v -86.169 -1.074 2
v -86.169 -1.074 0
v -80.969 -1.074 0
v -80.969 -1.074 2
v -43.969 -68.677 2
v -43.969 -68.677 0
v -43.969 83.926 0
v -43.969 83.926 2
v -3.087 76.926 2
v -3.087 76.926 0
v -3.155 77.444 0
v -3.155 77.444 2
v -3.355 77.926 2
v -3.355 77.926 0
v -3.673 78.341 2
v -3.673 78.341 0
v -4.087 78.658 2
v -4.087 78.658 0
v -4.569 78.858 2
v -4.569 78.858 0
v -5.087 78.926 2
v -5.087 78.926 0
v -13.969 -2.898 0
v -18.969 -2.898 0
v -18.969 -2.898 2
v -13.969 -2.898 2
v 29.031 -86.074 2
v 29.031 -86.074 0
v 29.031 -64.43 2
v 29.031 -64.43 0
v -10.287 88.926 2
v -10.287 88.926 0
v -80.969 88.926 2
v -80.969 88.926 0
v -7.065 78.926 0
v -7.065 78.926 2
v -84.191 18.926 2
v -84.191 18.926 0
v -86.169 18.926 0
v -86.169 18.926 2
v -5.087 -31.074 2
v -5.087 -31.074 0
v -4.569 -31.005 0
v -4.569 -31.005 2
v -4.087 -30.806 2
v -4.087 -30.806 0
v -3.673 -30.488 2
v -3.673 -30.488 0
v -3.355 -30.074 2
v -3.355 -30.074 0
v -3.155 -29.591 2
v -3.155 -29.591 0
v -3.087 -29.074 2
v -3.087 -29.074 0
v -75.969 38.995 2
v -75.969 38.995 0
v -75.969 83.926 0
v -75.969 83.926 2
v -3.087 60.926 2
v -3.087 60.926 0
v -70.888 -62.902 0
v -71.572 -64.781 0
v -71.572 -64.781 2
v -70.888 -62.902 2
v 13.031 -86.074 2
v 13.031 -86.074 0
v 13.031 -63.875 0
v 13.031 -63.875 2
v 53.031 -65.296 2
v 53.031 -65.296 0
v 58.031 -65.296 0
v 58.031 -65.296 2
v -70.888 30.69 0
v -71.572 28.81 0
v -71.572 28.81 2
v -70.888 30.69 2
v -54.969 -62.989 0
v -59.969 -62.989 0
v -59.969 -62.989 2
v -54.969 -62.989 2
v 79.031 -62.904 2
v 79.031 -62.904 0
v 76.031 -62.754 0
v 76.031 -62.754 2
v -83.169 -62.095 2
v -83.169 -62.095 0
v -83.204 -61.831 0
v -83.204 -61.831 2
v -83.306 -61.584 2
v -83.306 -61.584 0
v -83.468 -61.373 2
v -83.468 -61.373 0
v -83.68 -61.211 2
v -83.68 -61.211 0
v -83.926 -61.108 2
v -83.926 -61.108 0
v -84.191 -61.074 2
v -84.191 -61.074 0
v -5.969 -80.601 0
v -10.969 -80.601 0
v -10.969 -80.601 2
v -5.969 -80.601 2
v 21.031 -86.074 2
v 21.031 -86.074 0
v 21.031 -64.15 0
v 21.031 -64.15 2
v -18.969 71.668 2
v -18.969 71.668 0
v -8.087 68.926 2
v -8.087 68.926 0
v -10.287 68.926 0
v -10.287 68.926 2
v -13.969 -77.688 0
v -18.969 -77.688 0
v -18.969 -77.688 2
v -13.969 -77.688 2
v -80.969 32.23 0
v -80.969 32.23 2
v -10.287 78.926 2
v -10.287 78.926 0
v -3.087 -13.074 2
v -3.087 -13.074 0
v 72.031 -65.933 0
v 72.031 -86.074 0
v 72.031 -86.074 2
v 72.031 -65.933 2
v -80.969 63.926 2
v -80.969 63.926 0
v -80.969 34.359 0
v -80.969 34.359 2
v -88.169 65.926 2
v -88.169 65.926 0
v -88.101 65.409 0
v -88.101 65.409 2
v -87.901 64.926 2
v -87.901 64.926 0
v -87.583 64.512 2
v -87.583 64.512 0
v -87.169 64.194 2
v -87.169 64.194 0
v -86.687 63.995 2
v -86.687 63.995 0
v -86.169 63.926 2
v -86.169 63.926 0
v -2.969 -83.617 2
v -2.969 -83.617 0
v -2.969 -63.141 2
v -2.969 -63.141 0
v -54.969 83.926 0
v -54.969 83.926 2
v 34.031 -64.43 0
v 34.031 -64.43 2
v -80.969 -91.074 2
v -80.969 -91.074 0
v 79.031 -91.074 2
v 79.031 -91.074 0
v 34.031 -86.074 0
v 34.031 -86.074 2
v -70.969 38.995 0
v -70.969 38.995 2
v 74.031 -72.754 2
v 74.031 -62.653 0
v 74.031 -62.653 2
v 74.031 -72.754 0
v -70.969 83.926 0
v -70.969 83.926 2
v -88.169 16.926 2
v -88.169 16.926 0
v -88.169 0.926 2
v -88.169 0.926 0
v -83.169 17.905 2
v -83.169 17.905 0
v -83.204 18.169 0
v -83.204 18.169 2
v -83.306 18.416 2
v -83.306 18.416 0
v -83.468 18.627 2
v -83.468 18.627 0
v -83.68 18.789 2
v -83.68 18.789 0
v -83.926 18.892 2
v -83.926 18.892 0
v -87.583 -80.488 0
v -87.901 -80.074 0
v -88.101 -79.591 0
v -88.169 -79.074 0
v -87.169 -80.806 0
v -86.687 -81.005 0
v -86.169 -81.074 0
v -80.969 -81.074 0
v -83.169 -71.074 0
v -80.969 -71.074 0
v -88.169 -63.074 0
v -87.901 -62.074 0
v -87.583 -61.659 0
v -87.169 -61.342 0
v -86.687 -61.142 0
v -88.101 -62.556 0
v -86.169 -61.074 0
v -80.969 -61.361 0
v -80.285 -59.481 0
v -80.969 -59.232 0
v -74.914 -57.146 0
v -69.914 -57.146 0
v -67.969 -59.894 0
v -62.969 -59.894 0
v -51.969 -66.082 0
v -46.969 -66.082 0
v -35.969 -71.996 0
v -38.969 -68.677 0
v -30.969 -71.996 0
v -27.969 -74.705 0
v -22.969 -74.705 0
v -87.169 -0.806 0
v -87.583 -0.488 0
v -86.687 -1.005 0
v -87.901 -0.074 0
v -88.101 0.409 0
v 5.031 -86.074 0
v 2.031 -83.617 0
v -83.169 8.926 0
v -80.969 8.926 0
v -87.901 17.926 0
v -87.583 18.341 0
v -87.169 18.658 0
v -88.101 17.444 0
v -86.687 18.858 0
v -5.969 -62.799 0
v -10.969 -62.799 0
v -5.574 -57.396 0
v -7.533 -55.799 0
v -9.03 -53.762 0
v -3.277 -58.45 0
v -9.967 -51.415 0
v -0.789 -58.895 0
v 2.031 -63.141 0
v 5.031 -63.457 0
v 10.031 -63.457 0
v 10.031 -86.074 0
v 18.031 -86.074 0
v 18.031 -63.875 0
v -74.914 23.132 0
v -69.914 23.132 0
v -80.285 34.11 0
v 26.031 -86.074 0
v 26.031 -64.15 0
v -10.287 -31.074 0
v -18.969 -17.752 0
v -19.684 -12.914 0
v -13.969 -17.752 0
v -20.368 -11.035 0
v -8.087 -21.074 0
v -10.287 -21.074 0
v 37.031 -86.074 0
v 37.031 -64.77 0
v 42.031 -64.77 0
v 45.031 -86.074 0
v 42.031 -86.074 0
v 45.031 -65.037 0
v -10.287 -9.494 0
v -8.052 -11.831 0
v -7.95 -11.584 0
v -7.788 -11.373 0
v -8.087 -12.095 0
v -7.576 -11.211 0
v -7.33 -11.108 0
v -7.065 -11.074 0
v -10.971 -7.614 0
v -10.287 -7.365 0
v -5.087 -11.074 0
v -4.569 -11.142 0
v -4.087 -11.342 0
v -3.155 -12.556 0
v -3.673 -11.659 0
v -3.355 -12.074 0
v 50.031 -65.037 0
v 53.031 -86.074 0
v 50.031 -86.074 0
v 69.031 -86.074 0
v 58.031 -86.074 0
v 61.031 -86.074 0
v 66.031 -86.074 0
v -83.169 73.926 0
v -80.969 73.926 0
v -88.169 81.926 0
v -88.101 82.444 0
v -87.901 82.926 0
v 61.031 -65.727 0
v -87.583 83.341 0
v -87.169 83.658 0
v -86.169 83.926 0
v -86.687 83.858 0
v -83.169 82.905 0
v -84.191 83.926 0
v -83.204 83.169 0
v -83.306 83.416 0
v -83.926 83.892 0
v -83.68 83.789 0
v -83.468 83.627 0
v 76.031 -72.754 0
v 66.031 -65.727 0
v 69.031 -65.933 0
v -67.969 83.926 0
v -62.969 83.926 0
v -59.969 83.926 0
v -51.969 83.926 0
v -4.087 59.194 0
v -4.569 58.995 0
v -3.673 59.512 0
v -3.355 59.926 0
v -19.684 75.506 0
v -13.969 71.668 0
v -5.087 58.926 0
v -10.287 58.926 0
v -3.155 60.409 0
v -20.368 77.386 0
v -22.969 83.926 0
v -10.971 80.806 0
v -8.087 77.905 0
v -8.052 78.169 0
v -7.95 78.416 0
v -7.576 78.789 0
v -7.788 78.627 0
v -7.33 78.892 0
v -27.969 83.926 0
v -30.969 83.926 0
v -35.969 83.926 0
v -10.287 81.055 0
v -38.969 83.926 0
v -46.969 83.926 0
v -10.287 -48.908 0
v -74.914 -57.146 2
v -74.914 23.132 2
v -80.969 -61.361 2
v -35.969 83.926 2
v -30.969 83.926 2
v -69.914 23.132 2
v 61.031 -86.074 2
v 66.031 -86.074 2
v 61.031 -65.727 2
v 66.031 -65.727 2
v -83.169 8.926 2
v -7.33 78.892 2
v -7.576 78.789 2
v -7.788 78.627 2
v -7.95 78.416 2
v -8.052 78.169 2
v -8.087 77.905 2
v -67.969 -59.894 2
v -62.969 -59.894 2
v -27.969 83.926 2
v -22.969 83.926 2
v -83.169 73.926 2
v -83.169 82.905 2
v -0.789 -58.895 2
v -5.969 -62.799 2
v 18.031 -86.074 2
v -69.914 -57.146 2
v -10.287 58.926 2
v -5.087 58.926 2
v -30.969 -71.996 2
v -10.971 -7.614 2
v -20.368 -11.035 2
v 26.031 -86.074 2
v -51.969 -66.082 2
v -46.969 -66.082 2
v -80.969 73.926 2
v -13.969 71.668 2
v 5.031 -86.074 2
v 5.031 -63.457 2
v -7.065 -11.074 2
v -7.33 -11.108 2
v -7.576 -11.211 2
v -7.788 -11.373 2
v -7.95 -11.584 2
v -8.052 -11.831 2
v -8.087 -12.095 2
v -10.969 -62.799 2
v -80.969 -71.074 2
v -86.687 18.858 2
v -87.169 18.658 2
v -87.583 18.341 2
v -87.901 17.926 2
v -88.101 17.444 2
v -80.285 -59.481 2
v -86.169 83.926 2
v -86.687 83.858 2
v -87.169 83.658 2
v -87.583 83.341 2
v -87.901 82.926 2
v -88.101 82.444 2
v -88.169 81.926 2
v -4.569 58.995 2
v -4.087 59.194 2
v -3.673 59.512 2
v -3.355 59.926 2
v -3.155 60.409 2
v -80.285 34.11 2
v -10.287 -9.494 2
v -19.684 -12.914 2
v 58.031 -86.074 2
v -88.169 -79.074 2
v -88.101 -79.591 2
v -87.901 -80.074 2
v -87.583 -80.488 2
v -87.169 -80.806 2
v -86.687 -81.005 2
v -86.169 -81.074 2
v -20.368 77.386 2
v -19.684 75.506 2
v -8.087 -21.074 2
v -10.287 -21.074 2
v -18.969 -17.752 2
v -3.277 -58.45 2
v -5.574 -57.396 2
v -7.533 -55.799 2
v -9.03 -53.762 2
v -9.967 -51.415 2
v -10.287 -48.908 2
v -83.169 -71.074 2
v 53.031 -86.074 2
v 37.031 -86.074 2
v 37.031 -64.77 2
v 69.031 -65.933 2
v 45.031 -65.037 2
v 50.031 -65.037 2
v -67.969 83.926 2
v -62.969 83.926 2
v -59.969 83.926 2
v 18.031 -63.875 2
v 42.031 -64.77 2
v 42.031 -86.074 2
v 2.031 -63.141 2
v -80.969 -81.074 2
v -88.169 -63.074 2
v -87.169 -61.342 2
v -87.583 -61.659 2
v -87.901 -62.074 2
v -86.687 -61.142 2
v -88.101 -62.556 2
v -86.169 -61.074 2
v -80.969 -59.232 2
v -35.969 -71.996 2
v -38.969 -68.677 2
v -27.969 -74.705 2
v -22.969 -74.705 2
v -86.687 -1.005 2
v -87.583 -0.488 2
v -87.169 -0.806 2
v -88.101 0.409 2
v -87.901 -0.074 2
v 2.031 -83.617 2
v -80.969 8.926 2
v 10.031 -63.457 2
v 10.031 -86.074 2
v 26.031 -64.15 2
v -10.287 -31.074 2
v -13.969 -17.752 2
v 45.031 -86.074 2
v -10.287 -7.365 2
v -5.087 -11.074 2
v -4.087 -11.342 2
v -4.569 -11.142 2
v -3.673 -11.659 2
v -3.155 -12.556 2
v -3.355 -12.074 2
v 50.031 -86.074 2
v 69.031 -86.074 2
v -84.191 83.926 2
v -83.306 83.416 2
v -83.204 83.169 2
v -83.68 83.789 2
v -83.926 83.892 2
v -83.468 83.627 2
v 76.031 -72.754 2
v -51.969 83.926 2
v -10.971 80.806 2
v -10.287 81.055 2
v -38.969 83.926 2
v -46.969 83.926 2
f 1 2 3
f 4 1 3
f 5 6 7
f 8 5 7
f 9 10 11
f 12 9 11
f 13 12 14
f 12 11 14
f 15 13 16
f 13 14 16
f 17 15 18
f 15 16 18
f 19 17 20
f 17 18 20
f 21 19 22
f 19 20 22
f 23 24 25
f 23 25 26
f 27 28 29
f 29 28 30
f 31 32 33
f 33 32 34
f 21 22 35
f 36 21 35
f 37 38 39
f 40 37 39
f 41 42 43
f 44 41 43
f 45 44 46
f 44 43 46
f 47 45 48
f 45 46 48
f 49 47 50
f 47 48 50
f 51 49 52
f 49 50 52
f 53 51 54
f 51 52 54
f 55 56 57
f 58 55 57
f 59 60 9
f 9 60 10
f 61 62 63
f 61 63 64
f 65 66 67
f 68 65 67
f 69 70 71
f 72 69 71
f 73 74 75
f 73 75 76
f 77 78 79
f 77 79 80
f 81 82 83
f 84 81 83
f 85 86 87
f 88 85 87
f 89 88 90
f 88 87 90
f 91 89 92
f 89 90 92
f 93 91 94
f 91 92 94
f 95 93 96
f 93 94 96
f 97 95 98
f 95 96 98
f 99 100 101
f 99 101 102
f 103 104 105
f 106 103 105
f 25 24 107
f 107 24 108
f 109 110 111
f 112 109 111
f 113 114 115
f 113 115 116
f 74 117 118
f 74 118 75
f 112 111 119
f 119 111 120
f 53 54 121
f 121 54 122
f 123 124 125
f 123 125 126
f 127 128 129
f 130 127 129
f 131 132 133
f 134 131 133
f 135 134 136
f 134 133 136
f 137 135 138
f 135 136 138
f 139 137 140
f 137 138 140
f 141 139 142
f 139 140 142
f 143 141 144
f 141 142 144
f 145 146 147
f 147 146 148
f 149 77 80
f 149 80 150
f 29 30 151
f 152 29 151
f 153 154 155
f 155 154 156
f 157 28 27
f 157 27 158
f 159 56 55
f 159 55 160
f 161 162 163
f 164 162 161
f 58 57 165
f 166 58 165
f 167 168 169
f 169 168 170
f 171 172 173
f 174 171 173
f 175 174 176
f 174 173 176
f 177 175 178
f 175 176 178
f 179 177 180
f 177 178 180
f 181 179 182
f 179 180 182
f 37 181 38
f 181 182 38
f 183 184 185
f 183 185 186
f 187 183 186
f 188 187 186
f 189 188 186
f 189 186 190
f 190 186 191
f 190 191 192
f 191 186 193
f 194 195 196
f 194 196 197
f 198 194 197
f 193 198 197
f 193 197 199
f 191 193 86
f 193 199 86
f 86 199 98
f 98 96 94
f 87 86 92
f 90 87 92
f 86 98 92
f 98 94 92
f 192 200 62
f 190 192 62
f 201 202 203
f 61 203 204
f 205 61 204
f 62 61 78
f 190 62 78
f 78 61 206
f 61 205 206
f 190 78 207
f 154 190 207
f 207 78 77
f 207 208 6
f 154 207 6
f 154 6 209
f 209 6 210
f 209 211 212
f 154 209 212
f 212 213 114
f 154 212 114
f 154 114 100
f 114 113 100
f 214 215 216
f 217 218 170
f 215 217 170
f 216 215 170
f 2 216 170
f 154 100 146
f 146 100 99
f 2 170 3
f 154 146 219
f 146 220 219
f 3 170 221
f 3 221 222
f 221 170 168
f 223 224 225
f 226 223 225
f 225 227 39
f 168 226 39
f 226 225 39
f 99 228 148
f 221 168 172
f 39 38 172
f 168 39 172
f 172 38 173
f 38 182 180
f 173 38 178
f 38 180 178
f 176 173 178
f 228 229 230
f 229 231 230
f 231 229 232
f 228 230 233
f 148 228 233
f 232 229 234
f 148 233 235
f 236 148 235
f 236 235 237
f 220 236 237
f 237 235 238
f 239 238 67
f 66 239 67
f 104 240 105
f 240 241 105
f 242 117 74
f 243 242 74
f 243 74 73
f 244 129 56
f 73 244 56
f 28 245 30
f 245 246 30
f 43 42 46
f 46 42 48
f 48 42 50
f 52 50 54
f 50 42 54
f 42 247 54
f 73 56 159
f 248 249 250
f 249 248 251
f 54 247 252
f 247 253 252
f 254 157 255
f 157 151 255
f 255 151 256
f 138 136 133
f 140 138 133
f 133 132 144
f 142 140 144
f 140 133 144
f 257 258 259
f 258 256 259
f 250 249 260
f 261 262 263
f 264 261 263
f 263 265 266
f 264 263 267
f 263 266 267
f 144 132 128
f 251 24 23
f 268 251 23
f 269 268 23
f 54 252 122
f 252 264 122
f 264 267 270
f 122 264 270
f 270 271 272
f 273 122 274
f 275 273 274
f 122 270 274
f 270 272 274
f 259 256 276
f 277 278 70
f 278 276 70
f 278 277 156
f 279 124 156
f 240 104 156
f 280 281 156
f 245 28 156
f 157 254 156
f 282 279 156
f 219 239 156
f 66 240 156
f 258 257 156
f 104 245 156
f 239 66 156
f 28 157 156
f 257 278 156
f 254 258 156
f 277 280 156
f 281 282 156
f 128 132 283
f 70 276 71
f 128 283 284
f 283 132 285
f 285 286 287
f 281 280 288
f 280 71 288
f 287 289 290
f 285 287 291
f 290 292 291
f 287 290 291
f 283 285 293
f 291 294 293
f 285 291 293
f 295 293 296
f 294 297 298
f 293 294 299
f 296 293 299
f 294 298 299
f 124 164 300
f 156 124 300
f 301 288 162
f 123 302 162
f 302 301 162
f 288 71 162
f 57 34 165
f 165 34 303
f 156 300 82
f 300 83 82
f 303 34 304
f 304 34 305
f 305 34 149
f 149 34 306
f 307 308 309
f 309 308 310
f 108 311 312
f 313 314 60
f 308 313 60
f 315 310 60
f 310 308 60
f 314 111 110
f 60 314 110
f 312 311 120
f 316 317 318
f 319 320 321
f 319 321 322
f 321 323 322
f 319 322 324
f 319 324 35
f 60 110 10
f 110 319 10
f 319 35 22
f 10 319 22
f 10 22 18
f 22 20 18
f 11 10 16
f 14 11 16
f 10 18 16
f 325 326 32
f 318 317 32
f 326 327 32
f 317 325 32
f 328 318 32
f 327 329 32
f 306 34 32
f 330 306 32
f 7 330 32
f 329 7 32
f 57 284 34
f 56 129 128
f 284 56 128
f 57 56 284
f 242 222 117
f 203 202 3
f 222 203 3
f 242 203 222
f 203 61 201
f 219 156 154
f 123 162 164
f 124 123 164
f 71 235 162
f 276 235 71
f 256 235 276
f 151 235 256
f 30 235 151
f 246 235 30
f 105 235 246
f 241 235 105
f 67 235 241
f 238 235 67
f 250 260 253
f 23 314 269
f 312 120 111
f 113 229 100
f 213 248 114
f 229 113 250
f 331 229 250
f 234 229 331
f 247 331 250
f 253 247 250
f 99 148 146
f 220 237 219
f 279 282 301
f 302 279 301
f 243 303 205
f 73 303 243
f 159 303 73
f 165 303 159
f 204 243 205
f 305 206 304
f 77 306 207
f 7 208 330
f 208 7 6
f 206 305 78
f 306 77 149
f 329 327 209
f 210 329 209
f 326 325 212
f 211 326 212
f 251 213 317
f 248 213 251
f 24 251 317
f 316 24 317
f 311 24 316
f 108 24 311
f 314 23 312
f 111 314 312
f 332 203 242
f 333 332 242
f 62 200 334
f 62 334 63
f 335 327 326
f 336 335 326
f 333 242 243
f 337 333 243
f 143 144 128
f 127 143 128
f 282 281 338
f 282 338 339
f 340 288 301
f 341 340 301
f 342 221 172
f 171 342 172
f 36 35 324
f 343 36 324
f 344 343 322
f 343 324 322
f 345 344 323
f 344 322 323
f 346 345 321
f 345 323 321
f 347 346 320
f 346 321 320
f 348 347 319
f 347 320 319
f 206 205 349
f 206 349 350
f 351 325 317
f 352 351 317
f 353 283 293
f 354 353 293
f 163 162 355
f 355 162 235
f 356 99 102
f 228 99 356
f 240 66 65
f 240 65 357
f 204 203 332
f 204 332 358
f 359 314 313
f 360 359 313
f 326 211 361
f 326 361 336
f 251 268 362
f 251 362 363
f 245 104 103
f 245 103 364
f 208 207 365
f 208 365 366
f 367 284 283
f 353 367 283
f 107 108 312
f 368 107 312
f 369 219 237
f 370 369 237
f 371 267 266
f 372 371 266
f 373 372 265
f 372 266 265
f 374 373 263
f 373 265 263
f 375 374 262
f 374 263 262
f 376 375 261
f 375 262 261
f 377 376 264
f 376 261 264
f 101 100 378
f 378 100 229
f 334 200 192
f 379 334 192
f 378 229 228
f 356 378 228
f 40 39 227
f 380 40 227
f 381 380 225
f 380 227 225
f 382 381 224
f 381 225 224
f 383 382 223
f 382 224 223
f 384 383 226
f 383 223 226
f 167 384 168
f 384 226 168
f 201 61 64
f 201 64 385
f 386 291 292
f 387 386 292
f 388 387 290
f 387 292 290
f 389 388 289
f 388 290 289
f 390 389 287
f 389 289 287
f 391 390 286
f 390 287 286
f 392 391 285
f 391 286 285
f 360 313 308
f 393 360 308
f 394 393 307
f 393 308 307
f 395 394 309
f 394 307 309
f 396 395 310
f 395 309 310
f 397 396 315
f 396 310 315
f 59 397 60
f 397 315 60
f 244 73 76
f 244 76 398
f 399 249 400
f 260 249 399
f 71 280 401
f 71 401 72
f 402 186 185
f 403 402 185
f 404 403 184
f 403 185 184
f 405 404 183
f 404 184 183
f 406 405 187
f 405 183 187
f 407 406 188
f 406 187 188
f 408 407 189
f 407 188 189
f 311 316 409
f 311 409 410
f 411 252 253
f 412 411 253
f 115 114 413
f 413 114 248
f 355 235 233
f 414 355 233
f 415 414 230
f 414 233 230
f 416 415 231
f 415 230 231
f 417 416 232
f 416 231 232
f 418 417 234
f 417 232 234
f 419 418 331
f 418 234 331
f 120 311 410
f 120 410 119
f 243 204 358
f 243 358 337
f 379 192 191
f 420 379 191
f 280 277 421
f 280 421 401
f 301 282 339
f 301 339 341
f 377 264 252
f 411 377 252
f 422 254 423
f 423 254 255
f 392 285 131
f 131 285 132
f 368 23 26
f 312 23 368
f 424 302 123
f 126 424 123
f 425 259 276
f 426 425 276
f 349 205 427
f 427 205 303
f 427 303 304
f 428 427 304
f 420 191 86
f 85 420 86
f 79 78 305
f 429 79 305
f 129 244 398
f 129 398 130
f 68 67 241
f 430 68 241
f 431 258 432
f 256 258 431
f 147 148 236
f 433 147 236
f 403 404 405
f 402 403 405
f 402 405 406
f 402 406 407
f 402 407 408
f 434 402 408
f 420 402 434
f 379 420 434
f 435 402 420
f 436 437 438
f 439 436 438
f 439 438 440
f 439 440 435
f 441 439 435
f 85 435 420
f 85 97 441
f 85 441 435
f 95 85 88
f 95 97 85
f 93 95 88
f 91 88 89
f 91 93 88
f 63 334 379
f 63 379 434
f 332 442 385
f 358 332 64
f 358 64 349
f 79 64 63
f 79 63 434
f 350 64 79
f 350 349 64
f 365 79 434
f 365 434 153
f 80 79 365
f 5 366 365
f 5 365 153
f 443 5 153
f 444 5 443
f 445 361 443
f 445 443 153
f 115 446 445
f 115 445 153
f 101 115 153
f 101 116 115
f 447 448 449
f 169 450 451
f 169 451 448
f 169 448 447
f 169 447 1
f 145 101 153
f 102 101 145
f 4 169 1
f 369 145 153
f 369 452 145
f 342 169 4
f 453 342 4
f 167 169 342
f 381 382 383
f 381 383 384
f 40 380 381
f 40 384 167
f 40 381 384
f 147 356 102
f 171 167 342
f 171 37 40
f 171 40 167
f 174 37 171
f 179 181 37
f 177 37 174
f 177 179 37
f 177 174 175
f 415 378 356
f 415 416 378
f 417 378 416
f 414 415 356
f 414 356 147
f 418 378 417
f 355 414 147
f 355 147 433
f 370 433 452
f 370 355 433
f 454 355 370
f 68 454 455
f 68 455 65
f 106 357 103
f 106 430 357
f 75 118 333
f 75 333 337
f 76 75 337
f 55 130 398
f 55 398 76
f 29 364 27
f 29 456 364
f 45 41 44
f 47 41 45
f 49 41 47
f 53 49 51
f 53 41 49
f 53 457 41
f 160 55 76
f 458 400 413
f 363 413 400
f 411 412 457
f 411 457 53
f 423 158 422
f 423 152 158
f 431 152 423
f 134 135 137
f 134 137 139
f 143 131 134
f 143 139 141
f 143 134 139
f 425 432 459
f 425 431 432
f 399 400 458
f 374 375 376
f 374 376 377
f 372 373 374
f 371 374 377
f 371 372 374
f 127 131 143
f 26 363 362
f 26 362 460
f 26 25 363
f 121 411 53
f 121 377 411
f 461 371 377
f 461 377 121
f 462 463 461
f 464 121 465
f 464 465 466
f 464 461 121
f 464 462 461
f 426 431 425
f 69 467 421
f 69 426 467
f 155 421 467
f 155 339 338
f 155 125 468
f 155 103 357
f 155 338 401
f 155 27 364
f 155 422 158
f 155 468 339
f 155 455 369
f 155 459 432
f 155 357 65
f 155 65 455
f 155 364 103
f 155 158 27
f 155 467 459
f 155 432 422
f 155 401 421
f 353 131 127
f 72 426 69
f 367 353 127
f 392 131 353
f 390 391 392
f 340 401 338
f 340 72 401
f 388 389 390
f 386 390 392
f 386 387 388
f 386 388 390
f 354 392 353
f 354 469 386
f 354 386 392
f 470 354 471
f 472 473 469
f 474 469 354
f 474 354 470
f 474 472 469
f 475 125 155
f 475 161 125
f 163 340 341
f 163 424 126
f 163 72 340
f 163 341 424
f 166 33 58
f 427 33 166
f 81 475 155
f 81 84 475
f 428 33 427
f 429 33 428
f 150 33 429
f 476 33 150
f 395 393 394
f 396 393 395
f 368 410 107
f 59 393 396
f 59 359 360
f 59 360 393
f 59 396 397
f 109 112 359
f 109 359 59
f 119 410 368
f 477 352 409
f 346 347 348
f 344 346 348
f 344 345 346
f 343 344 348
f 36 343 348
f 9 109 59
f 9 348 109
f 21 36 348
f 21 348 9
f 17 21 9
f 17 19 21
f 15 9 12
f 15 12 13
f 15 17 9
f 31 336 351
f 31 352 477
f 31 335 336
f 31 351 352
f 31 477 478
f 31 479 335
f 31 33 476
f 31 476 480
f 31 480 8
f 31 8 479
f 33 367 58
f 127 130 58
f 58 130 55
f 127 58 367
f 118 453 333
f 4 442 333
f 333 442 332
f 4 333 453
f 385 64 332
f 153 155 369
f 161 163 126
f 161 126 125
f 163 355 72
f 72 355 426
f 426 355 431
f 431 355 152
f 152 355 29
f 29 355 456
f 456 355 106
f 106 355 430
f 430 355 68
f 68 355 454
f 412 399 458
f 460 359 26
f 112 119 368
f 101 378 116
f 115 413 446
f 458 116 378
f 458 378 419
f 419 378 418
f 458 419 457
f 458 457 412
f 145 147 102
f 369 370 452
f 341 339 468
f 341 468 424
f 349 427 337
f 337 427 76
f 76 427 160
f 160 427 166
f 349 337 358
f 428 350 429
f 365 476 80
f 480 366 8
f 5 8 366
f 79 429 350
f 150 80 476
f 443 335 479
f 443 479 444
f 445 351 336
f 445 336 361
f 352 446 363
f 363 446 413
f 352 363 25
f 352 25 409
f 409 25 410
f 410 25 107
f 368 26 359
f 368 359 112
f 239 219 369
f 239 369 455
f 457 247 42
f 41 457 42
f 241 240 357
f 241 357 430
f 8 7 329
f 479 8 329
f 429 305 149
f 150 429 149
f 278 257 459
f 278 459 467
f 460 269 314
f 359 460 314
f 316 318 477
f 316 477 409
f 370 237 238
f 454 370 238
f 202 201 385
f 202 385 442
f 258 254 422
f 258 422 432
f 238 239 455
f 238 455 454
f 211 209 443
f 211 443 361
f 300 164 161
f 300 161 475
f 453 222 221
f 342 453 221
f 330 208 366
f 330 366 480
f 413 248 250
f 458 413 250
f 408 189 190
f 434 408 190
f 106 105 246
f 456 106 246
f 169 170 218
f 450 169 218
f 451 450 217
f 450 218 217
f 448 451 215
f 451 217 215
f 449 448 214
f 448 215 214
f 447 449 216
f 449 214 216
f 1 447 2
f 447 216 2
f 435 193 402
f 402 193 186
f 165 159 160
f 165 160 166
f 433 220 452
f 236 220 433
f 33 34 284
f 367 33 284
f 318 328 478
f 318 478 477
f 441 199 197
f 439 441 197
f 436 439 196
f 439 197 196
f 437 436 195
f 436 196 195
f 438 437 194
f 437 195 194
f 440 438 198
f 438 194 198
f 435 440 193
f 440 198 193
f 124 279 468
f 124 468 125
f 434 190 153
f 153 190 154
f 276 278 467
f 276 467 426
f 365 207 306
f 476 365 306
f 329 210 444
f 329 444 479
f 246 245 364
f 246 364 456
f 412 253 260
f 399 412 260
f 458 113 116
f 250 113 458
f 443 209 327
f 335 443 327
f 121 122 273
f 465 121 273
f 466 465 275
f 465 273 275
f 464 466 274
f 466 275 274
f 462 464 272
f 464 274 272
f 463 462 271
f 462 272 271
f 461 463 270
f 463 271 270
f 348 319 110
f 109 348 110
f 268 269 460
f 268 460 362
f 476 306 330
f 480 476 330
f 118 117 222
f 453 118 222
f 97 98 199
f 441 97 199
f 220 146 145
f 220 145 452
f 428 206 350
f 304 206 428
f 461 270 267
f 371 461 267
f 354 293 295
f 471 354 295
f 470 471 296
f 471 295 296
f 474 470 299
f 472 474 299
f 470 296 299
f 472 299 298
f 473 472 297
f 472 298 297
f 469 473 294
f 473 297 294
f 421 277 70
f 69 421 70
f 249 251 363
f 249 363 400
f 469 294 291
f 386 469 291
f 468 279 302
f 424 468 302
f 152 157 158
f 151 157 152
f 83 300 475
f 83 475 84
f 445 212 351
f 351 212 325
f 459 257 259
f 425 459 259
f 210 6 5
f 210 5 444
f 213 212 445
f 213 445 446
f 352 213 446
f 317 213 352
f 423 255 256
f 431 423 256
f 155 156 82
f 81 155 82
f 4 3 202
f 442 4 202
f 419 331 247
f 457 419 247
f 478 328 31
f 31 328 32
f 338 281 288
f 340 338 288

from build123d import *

# Parameters (mm, degrees)
F2_DEPTH = 2
F3_W     = 2
F3_H     = 10
F3_H_2   = 7.419568
F4_DEPTH = 25
F6_DEPTH = 2
F7_W     = 5
F7_H     = 44.93185
F7_H_2   = 80.277377
F7_H_3   = 143.82022
F7_H_4   = 146.914949
F7_H_5   = 150.008155
F7_H_6   = 155.922672
F7_H_7   = 152.60311
F7_H_8   = 158.631397
F7_H_9   = 74.565352
F7_H_10  = 59.935174
F7_H_11  = 17.802537
F7_H_12  = 20.475702
F7_H_13  = 22.61665
F7_H_14  = 22.198746
F7_H_15  = 21.923671
F7_H_16  = 21.644043
F7_H_17  = 21.303791
F7_H_18  = 21.036336
F7_H_19  = 20.777645
F7_H_20  = 20.346487
F7_W_2   = 3
F7_H_21  = 20.140204
F8_DEPTH = 5


with BuildPart() as f2:
    # F1 (on Top) → F2 (new body)
    with BuildSketch(Plane.XY):
        with BuildLine():
            Line((-10.286918, 88.926369), (-80.9691, 88.926369))
            Line((-80.9691, 88.926369), (-80.9691, -91.073631))
            Line((-80.9691, -91.073631), (79.0309, -91.073631))
            Line((79.0309, -91.073631), (79.0309, -62.904311))
            Line((79.0309, -62.904311), (-0.788567, -58.895134))
            ThreePointArc((-0.788567, -58.895134), (-7.533175, -55.799151), (-10.286918, -48.907724))
            Line((-10.286918, -48.907724), (-10.286918, 88.926369))
        make_face()
    extrude(amount=F2_DEPTH)

    # F3 (on Top) → F4 (cut)
    with BuildSketch(Plane.XY):
        Polygon((-10.970959, -7.614357), (-20.367885, -11.034559), (-19.683845, -12.913944), (-10.286918, -9.493742), align=None)
        Polygon((-5.092329, -5.474711), (-10.970959, -7.614357), (-10.286918, -9.493742), (-4.408289, -7.354096), align=None)
        Polygon((-10.970959, 80.805754), (-20.367885, 77.385553), (-19.683845, 75.506168), (-10.286918, 78.926369), align=None)
        Polygon((-3.998845, 83.343396), (-10.970959, 80.805754), (-10.286918, 78.926369), (-3.314805, 81.464011), align=None)
        Polygon((-80.9691, 32.230381), (-71.572174, 28.810179), (-70.888133, 30.689565), (-80.28506, 34.109766), align=None)
        Polygon((-87.941213, 34.768023), (-80.9691, 32.230381), (-80.28506, 34.109766), (-87.257173, 36.647408), align=None)
        Polygon((-80.9691, -61.360746), (-71.572174, -64.780947), (-70.888133, -62.901562), (-80.28506, -59.48136), align=None)
        Polygon((-87.941213, -58.823104), (-80.9691, -61.360746), (-80.28506, -59.48136), (-87.257173, -56.943719), align=None)
        with Locations((75.0309, -67.753627)):
            Rectangle(F3_W, F3_H)
        with Locations((75.0309, -59.043843)):
            Rectangle(F3_W, F3_H_2)
    extrude(amount=F4_DEPTH, mode=Mode.SUBTRACT)

    # F5 (on Top) → F6 (join)
    with BuildSketch(Plane.XY):
        with BuildLine():
            Line((-84.190791, -61.073631), (-86.1691, -61.073631))
            ThreePointArc((-86.1691, -61.073631), (-87.583313, -61.659417), (-88.1691, -63.073631))
            Line((-88.1691, -63.073631), (-88.1691, -79.073631))
            ThreePointArc((-88.1691, -79.073631), (-87.583313, -80.487844), (-86.1691, -81.073631))
            Line((-86.1691, -81.073631), (-83.1691, -81.073631))
            Line((-83.1691, -81.073631), (-80.9691, -81.073631))
            Line((-80.9691, -81.073631), (-80.9691, -71.073631))
            Line((-80.9691, -71.073631), (-83.1691, -71.073631))
            Line((-83.1691, -71.073631), (-83.1691, -62.095322))
            ThreePointArc((-83.1691, -62.095322), (-83.468346, -61.372877), (-84.190791, -61.073631))
        make_face()
        with BuildLine():
            Line((-84.190791, 18.926369), (-86.1691, 18.926369))
            ThreePointArc((-86.1691, 18.926369), (-87.583313, 18.340583), (-88.1691, 16.926369))
            Line((-88.1691, 16.926369), (-88.1691, 0.926369))
            ThreePointArc((-88.1691, 0.926369), (-87.583313, -0.487844), (-86.1691, -1.073631))
            Line((-86.1691, -1.073631), (-83.1691, -1.073631))
            Line((-83.1691, -1.073631), (-80.9691, -1.073631))
            Line((-80.9691, -1.073631), (-80.9691, 8.926369))
            Line((-80.9691, 8.926369), (-83.1691, 8.926369))
            Line((-83.1691, 8.926369), (-83.1691, 17.904678))
            ThreePointArc((-83.1691, 17.904678), (-83.468346, 18.627123), (-84.190791, 18.926369))
        make_face()
        with BuildLine():
            Line((-84.190791, 83.926369), (-86.1691, 83.926369))
            ThreePointArc((-86.1691, 83.926369), (-87.583313, 83.340583), (-88.1691, 81.926369))
            Line((-88.1691, 81.926369), (-88.1691, 65.926369))
            ThreePointArc((-88.1691, 65.926369), (-87.583313, 64.512156), (-86.1691, 63.926369))
            Line((-86.1691, 63.926369), (-80.9691, 63.926369))
            Line((-80.9691, 63.926369), (-80.9691, 73.926369))
            Line((-80.9691, 73.926369), (-83.1691, 73.926369))
            Line((-83.1691, 73.926369), (-83.1691, 82.904678))
            ThreePointArc((-83.1691, 82.904678), (-83.468346, 83.627123), (-84.190791, 83.926369))
        make_face()
        with BuildLine():
            Line((-10.286918, 58.926369), (-9.800001, 58.926369))
            Line((-9.800001, 58.926369), (-8.086918, 58.926369))
            Line((-8.086918, 58.926369), (-7.600001, 58.926369))
            Line((-7.600001, 58.926369), (-5.086918, 58.926369))
            ThreePointArc((-5.086918, 58.926369), (-3.672705, 59.512156), (-3.086918, 60.926369))
            Line((-3.086918, 60.926369), (-3.086918, 76.926369))
            ThreePointArc((-3.086918, 76.926369), (-3.672705, 78.340583), (-5.086918, 78.926369))
            Line((-5.086918, 78.926369), (-7.065227, 78.926369))
            ThreePointArc((-7.065227, 78.926369), (-7.787672, 78.627123), (-8.086918, 77.904678))
            Line((-8.086918, 77.904678), (-8.086918, 68.926369))
            Line((-8.086918, 68.926369), (-10.286918, 68.926369))
            Line((-10.286918, 68.926369), (-10.286918, 58.926369))
        make_face()
        with BuildLine():
            Line((-10.286918, -21.073631), (-10.286918, -31.073631))
            Line((-10.286918, -31.073631), (-8.086918, -31.073631))
            Line((-8.086918, -31.073631), (-5.086918, -31.073631))
            ThreePointArc((-5.086918, -31.073631), (-3.672705, -30.487844), (-3.086918, -29.073631))
            Line((-3.086918, -29.073631), (-3.086918, -13.073631))
            ThreePointArc((-3.086918, -13.073631), (-3.672705, -11.659417), (-5.086918, -11.073631))
            Line((-5.086918, -11.073631), (-7.065227, -11.073631))
            ThreePointArc((-7.065227, -11.073631), (-7.787672, -11.372877), (-8.086918, -12.095322))
            Line((-8.086918, -12.095322), (-8.086918, -21.073631))
            Line((-8.086918, -21.073631), (-10.286918, -21.073631))
        make_face()
    extrude(amount=F6_DEPTH)

    # F7 (on Top) → F8 (cut)
    with BuildSketch(Plane.XY):
        with Locations((-73.4691, 61.460444)):
            Rectangle(F7_W, F7_H)
        with Locations((-72.413613, -17.006834)):
            Rectangle(F7_W, F7_H_2)
        with Locations((-65.4691, 12.016259)):
            Rectangle(F7_W, F7_H_3)
        with Locations((-57.4691, 10.468894)):
            Rectangle(F7_W, F7_H_4)
        with Locations((-49.4691, 8.922292)):
            Rectangle(F7_W, F7_H_5)
        with Locations((-33.4691, 5.965033)):
            Rectangle(F7_W, F7_H_6)
        with Locations((-41.4691, 7.624814)):
            Rectangle(F7_W, F7_H_7)
        with Locations((-25.4691, 4.61067)):
            Rectangle(F7_W, F7_H_8)
        with Locations((-16.4691, 34.384946)):
            Rectangle(F7_W, F7_H_9)
        with Locations((-16.4691, -47.720004)):
            Rectangle(F7_W, F7_H_10)
        with Locations((-8.4691, -71.7002)):
            Rectangle(F7_W, F7_H_11)
        with Locations((-0.4691, -73.37924)):
            Rectangle(F7_W, F7_H_12)
        with Locations((7.5309, -74.765306)):
            Rectangle(F7_W, F7_H_13)
        with Locations((15.5309, -74.974258)):
            Rectangle(F7_W, F7_H_14)
        with Locations((23.5309, -75.111795)):
            Rectangle(F7_W, F7_H_15)
        with Locations((31.5309, -75.25161)):
            Rectangle(F7_W, F7_H_16)
        with Locations((39.5309, -75.421735)):
            Rectangle(F7_W, F7_H_17)
        with Locations((47.5309, -75.555463)):
            Rectangle(F7_W, F7_H_18)
        with Locations((55.5309, -75.684809)):
            Rectangle(F7_W, F7_H_19)
        with Locations((63.5309, -75.900387)):
            Rectangle(F7_W, F7_H_20)
        with Locations((70.5309, -76.003529)):
            Rectangle(F7_W_2, F7_H_21)
    extrude(amount=F8_DEPTH, mode=Mode.SUBTRACT)


solid = f2.part
